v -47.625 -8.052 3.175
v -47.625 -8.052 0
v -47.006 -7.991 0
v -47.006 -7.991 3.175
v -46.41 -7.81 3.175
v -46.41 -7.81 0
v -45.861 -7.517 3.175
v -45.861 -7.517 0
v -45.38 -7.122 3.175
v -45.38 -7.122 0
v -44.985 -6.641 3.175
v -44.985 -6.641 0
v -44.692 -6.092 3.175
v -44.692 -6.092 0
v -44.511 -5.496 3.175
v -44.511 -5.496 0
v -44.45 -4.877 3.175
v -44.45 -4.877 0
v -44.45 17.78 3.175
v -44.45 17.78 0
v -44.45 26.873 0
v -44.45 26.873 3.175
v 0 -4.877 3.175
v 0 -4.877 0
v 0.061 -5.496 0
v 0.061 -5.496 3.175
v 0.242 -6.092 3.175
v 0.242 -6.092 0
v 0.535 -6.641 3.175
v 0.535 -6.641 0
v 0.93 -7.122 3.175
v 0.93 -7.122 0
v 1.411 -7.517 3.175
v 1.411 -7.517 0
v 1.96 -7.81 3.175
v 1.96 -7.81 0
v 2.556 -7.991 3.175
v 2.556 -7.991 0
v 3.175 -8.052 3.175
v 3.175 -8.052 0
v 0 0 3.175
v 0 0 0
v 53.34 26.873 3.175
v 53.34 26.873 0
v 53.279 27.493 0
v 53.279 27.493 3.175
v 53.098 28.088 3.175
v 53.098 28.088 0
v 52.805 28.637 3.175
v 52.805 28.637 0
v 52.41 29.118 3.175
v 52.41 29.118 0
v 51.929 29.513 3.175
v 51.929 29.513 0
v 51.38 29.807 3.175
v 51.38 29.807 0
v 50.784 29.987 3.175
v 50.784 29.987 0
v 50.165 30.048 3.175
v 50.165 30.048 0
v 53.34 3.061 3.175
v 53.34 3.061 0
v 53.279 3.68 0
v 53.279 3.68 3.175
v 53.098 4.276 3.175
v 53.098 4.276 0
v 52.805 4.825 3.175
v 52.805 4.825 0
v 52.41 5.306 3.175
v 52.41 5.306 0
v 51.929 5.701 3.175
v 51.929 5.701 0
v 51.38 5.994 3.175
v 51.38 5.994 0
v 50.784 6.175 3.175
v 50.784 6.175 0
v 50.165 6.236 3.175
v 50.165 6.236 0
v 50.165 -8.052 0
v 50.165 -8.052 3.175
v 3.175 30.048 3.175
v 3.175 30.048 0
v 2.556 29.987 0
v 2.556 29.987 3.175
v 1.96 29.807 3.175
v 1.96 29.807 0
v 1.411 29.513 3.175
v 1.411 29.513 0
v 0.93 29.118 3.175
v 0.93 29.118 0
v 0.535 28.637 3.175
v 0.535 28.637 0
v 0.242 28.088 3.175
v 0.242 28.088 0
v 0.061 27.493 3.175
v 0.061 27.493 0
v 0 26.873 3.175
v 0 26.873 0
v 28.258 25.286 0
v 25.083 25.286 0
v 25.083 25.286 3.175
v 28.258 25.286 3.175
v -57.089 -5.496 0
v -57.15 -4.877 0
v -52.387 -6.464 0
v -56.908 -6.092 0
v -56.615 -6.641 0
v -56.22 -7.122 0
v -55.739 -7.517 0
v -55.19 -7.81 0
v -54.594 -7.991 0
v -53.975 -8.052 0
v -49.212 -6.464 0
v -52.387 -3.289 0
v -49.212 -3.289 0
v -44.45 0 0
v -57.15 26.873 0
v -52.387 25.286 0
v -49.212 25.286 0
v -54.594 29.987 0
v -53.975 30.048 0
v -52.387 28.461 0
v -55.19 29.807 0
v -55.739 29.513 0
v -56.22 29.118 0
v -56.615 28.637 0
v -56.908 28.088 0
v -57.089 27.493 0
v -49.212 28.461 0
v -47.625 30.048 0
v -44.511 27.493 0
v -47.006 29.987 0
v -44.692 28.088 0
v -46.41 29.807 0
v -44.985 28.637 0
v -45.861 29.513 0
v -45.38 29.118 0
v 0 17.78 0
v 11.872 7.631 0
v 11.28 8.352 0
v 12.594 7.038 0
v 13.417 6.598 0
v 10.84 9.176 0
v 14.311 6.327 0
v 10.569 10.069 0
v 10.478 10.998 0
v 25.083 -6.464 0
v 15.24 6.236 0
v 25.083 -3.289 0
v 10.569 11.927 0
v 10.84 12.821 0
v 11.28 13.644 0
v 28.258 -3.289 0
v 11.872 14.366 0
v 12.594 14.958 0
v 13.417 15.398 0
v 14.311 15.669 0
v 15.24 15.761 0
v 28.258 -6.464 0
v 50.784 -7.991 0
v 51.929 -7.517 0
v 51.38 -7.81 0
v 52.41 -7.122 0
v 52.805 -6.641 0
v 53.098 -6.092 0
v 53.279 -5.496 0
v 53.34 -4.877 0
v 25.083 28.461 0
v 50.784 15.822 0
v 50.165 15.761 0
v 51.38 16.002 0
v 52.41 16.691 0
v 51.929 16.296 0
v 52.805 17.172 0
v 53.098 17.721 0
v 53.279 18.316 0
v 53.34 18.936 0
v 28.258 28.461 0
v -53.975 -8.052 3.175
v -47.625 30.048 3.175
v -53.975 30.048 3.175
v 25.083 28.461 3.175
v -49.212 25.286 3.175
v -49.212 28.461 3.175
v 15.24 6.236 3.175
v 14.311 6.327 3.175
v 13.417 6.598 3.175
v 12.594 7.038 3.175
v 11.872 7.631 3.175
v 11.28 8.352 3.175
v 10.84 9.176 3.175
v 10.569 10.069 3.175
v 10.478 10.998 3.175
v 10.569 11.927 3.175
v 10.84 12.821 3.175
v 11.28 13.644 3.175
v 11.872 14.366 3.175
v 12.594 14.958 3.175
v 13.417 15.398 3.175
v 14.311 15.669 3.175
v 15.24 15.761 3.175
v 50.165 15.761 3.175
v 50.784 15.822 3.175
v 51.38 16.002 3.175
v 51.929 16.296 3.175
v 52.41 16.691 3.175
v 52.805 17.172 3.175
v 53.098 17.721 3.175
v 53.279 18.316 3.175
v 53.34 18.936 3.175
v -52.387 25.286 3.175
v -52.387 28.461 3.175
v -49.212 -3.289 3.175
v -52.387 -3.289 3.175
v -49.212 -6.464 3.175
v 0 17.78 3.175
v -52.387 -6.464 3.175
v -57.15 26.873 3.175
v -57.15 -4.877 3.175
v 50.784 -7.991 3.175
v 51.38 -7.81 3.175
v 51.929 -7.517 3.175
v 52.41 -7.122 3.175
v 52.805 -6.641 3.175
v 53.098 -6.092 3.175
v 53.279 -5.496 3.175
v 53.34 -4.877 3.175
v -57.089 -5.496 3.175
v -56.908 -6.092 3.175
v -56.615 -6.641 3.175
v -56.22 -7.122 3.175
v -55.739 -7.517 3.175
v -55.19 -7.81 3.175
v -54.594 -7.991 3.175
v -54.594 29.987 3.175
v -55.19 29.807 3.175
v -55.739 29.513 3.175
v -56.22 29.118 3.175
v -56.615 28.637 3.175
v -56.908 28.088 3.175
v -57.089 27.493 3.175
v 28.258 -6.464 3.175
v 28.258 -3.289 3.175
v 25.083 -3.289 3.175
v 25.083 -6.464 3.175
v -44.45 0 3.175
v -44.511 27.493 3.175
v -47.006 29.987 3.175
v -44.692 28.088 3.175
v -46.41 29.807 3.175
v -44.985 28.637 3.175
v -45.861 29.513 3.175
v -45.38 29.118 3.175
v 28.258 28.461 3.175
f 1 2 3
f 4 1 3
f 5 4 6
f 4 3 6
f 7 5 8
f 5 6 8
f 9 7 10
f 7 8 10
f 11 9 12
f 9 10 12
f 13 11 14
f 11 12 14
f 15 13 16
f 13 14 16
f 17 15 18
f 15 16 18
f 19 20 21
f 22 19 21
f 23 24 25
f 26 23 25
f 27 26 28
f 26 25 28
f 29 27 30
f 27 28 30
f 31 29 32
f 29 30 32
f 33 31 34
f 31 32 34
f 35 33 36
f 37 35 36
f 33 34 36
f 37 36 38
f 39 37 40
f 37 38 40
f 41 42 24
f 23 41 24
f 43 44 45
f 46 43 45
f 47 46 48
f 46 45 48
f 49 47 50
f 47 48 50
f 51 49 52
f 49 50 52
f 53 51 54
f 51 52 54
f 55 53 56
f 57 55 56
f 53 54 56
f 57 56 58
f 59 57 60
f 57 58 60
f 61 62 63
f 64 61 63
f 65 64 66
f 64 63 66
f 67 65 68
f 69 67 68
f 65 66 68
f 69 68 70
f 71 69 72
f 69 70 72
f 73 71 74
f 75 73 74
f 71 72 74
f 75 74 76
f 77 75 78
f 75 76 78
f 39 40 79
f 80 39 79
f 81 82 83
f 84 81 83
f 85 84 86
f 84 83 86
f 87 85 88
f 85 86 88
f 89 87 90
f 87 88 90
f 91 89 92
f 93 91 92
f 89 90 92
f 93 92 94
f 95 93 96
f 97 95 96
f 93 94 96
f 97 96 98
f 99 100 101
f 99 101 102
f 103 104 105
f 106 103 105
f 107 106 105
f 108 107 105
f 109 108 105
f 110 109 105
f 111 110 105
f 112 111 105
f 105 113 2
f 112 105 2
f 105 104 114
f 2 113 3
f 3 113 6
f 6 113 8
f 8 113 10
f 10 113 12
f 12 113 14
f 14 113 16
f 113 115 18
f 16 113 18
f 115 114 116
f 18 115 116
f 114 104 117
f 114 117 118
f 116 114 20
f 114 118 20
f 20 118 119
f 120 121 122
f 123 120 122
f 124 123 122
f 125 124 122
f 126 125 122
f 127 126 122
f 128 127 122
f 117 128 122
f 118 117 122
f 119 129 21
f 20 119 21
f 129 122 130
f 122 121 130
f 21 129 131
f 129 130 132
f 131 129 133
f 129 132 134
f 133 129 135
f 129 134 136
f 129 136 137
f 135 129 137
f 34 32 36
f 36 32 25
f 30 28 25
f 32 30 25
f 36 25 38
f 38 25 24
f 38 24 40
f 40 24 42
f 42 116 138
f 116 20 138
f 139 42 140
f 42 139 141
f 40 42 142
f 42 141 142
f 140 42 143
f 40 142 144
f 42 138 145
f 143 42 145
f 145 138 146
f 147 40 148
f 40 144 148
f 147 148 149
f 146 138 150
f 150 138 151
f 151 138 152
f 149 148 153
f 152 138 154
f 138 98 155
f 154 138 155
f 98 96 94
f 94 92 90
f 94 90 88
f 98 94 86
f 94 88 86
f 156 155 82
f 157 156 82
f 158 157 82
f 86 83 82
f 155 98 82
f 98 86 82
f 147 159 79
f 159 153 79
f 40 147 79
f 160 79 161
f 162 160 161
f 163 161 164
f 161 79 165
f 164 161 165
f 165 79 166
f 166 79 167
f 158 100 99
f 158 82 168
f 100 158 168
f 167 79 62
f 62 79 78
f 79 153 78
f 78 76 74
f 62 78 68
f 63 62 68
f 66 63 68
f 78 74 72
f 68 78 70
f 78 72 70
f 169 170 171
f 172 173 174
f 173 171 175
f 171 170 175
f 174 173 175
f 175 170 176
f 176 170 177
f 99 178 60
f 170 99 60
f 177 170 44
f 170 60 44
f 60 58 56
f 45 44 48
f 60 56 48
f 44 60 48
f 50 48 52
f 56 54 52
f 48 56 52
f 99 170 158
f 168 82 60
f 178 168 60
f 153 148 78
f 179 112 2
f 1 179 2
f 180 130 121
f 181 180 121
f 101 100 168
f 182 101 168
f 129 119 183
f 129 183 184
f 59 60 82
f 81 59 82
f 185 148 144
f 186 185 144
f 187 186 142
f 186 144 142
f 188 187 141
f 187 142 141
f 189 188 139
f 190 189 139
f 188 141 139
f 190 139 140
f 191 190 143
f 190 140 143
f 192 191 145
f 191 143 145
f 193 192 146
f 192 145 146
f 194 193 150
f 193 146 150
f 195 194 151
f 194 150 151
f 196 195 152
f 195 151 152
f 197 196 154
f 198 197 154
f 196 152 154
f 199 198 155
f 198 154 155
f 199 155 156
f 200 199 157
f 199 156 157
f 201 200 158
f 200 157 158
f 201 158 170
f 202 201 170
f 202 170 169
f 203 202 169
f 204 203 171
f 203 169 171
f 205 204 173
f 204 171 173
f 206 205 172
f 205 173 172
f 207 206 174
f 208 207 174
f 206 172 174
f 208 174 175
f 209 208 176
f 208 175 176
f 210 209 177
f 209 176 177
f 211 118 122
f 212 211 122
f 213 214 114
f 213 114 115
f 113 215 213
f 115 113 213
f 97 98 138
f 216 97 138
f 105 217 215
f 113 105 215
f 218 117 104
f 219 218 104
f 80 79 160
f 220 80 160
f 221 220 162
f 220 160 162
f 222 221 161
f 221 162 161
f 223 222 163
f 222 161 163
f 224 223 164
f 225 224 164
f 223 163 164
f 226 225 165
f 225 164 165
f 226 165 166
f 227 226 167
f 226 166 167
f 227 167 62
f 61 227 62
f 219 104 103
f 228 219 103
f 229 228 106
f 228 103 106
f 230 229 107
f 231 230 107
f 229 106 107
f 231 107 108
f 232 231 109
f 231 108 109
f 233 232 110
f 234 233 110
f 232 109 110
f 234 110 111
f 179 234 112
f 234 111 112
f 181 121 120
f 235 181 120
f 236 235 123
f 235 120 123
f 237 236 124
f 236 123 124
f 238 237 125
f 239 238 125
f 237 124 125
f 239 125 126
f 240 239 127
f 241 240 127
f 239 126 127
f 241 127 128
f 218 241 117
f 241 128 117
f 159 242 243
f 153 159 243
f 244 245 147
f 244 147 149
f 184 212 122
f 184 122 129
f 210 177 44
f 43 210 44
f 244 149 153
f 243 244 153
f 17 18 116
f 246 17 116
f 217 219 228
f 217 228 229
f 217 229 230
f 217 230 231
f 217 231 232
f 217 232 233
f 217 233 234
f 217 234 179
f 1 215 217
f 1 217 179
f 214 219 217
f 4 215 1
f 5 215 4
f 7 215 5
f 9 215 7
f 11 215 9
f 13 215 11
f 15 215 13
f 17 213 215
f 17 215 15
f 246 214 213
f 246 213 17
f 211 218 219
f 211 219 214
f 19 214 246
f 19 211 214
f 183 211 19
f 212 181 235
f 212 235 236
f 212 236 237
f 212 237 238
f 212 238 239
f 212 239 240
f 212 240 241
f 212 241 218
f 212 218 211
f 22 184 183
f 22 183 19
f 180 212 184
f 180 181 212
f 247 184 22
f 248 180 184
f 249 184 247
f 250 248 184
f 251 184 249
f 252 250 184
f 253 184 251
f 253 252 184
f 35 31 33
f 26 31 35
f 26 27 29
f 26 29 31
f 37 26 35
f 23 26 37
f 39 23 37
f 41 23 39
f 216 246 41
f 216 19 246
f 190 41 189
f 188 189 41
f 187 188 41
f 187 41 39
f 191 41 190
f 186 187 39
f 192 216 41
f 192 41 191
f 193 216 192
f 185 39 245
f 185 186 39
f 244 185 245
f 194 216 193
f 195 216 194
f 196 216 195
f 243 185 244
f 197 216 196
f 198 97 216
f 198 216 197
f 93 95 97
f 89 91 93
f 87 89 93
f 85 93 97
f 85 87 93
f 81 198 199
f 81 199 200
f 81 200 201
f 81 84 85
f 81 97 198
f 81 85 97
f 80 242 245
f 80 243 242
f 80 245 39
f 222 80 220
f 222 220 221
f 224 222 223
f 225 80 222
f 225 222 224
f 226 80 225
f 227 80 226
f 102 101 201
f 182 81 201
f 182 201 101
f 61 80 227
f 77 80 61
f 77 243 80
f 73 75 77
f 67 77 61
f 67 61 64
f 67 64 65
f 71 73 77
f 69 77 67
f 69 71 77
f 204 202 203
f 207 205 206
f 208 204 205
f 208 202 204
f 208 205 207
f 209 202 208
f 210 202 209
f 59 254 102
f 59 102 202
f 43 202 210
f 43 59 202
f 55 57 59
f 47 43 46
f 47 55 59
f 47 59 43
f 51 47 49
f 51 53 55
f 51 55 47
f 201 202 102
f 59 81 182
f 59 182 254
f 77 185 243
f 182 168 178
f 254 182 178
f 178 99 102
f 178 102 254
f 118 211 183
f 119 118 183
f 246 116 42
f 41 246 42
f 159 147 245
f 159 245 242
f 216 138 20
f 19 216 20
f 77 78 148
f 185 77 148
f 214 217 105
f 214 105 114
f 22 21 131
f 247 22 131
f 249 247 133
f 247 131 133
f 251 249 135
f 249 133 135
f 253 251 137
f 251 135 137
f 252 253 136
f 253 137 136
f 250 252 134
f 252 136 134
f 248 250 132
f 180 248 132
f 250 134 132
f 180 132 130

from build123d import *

# Parameters (mm, degrees)
BOSS_EXTRUDE1_DEPTH     = 3.175
SKETCH2_W               = 3.175
SKETCH2_H               = 3.175
CUT_EXTRUDE1_DEPTH      = 1
CUT_EXTRUDE1_DEPTH_BACK = 4.175


with BuildPart() as part:
    # Sketch1 → Boss-Extrude1 (new body)
    with BuildSketch(Plane.XY):
        with BuildLine():
            Line((15.24, 15.7607), (50.165, 15.7607))
            ThreePointArc((50.165, 15.7607), (52.41006403, 16.69063597), (53.34, 18.9357))
            Line((53.34, 18.9357), (53.34, 26.8732))
            ThreePointArc((53.34, 26.8732), (52.41006403, 29.11826403), (50.165, 30.0482))
            Line((50.165, 30.0482), (3.175, 30.0482))
            ThreePointArc((3.175, 30.0482), (0.92993597, 29.11826403), (0, 26.8732))
            Line((0, 26.8732), (0, 17.78))
            Line((0, 17.78), (-44.45, 17.78))
            Line((-44.45, 17.78), (-44.45, 26.8732))
            ThreePointArc((-44.45, 26.8732), (-45.37993597, 29.11826403), (-47.625, 30.0482))
            Line((-47.625, 30.0482), (-53.975, 30.0482))
            ThreePointArc((-53.975, 30.0482), (-56.22006403, 29.11826403), (-57.15, 26.8732))
            Line((-57.15, 26.8732), (-57.15, -4.8768))
            ThreePointArc((-57.15, -4.8768), (-56.22006403, -7.12186403), (-53.975, -8.0518))
            Line((-53.975, -8.0518), (-47.625, -8.0518))
            ThreePointArc((-47.625, -8.0518), (-45.37993597, -7.12186403), (-44.45, -4.8768))
            Line((-44.45, -4.8768), (-44.45, 0))
            Line((-44.45, 0), (0, 0))
            Line((0, 0), (0, -4.8768))
            ThreePointArc((0, -4.8768), (0.92993597, -7.12186403), (3.175, -8.0518))
            Line((3.175, -8.0518), (50.165, -8.0518))
            ThreePointArc((50.165, -8.0518), (52.41006403, -7.12186403), (53.34, -4.8768))
            Line((53.34, -4.8768), (53.34, 3.0607))
            ThreePointArc((53.34, 3.0607), (52.41006403, 5.30576403), (50.165, 6.2357))
            Line((50.165, 6.2357), (15.24, 6.2357))
            ThreePointArc((15.24, 6.2357), (10.4775, 10.9982), (15.24, 15.7607))
        make_face()
    extrude(amount=BOSS_EXTRUDE1_DEPTH)

    # Sketch2 → Cut-Extrude1 (cut, two sides)
    with BuildSketch(Plane.XY.offset(3.175)) as cut_extrude1_sk:
        with Locations((26.67, -4.8768)):
            Rectangle(SKETCH2_W, SKETCH2_H)
        with Locations((-50.8, 26.8732)):
            Rectangle(SKETCH2_W, SKETCH2_H)
        with Locations((26.67, 26.8732)):
            Rectangle(SKETCH2_W, SKETCH2_H)
        with Locations((-50.8, -4.8768)):
            Rectangle(SKETCH2_W, SKETCH2_H)
    extrude(amount=CUT_EXTRUDE1_DEPTH, mode=Mode.SUBTRACT)
    extrude(cut_extrude1_sk.sketch, amount=-CUT_EXTRUDE1_DEPTH_BACK, mode=Mode.SUBTRACT)


solid = part.part
